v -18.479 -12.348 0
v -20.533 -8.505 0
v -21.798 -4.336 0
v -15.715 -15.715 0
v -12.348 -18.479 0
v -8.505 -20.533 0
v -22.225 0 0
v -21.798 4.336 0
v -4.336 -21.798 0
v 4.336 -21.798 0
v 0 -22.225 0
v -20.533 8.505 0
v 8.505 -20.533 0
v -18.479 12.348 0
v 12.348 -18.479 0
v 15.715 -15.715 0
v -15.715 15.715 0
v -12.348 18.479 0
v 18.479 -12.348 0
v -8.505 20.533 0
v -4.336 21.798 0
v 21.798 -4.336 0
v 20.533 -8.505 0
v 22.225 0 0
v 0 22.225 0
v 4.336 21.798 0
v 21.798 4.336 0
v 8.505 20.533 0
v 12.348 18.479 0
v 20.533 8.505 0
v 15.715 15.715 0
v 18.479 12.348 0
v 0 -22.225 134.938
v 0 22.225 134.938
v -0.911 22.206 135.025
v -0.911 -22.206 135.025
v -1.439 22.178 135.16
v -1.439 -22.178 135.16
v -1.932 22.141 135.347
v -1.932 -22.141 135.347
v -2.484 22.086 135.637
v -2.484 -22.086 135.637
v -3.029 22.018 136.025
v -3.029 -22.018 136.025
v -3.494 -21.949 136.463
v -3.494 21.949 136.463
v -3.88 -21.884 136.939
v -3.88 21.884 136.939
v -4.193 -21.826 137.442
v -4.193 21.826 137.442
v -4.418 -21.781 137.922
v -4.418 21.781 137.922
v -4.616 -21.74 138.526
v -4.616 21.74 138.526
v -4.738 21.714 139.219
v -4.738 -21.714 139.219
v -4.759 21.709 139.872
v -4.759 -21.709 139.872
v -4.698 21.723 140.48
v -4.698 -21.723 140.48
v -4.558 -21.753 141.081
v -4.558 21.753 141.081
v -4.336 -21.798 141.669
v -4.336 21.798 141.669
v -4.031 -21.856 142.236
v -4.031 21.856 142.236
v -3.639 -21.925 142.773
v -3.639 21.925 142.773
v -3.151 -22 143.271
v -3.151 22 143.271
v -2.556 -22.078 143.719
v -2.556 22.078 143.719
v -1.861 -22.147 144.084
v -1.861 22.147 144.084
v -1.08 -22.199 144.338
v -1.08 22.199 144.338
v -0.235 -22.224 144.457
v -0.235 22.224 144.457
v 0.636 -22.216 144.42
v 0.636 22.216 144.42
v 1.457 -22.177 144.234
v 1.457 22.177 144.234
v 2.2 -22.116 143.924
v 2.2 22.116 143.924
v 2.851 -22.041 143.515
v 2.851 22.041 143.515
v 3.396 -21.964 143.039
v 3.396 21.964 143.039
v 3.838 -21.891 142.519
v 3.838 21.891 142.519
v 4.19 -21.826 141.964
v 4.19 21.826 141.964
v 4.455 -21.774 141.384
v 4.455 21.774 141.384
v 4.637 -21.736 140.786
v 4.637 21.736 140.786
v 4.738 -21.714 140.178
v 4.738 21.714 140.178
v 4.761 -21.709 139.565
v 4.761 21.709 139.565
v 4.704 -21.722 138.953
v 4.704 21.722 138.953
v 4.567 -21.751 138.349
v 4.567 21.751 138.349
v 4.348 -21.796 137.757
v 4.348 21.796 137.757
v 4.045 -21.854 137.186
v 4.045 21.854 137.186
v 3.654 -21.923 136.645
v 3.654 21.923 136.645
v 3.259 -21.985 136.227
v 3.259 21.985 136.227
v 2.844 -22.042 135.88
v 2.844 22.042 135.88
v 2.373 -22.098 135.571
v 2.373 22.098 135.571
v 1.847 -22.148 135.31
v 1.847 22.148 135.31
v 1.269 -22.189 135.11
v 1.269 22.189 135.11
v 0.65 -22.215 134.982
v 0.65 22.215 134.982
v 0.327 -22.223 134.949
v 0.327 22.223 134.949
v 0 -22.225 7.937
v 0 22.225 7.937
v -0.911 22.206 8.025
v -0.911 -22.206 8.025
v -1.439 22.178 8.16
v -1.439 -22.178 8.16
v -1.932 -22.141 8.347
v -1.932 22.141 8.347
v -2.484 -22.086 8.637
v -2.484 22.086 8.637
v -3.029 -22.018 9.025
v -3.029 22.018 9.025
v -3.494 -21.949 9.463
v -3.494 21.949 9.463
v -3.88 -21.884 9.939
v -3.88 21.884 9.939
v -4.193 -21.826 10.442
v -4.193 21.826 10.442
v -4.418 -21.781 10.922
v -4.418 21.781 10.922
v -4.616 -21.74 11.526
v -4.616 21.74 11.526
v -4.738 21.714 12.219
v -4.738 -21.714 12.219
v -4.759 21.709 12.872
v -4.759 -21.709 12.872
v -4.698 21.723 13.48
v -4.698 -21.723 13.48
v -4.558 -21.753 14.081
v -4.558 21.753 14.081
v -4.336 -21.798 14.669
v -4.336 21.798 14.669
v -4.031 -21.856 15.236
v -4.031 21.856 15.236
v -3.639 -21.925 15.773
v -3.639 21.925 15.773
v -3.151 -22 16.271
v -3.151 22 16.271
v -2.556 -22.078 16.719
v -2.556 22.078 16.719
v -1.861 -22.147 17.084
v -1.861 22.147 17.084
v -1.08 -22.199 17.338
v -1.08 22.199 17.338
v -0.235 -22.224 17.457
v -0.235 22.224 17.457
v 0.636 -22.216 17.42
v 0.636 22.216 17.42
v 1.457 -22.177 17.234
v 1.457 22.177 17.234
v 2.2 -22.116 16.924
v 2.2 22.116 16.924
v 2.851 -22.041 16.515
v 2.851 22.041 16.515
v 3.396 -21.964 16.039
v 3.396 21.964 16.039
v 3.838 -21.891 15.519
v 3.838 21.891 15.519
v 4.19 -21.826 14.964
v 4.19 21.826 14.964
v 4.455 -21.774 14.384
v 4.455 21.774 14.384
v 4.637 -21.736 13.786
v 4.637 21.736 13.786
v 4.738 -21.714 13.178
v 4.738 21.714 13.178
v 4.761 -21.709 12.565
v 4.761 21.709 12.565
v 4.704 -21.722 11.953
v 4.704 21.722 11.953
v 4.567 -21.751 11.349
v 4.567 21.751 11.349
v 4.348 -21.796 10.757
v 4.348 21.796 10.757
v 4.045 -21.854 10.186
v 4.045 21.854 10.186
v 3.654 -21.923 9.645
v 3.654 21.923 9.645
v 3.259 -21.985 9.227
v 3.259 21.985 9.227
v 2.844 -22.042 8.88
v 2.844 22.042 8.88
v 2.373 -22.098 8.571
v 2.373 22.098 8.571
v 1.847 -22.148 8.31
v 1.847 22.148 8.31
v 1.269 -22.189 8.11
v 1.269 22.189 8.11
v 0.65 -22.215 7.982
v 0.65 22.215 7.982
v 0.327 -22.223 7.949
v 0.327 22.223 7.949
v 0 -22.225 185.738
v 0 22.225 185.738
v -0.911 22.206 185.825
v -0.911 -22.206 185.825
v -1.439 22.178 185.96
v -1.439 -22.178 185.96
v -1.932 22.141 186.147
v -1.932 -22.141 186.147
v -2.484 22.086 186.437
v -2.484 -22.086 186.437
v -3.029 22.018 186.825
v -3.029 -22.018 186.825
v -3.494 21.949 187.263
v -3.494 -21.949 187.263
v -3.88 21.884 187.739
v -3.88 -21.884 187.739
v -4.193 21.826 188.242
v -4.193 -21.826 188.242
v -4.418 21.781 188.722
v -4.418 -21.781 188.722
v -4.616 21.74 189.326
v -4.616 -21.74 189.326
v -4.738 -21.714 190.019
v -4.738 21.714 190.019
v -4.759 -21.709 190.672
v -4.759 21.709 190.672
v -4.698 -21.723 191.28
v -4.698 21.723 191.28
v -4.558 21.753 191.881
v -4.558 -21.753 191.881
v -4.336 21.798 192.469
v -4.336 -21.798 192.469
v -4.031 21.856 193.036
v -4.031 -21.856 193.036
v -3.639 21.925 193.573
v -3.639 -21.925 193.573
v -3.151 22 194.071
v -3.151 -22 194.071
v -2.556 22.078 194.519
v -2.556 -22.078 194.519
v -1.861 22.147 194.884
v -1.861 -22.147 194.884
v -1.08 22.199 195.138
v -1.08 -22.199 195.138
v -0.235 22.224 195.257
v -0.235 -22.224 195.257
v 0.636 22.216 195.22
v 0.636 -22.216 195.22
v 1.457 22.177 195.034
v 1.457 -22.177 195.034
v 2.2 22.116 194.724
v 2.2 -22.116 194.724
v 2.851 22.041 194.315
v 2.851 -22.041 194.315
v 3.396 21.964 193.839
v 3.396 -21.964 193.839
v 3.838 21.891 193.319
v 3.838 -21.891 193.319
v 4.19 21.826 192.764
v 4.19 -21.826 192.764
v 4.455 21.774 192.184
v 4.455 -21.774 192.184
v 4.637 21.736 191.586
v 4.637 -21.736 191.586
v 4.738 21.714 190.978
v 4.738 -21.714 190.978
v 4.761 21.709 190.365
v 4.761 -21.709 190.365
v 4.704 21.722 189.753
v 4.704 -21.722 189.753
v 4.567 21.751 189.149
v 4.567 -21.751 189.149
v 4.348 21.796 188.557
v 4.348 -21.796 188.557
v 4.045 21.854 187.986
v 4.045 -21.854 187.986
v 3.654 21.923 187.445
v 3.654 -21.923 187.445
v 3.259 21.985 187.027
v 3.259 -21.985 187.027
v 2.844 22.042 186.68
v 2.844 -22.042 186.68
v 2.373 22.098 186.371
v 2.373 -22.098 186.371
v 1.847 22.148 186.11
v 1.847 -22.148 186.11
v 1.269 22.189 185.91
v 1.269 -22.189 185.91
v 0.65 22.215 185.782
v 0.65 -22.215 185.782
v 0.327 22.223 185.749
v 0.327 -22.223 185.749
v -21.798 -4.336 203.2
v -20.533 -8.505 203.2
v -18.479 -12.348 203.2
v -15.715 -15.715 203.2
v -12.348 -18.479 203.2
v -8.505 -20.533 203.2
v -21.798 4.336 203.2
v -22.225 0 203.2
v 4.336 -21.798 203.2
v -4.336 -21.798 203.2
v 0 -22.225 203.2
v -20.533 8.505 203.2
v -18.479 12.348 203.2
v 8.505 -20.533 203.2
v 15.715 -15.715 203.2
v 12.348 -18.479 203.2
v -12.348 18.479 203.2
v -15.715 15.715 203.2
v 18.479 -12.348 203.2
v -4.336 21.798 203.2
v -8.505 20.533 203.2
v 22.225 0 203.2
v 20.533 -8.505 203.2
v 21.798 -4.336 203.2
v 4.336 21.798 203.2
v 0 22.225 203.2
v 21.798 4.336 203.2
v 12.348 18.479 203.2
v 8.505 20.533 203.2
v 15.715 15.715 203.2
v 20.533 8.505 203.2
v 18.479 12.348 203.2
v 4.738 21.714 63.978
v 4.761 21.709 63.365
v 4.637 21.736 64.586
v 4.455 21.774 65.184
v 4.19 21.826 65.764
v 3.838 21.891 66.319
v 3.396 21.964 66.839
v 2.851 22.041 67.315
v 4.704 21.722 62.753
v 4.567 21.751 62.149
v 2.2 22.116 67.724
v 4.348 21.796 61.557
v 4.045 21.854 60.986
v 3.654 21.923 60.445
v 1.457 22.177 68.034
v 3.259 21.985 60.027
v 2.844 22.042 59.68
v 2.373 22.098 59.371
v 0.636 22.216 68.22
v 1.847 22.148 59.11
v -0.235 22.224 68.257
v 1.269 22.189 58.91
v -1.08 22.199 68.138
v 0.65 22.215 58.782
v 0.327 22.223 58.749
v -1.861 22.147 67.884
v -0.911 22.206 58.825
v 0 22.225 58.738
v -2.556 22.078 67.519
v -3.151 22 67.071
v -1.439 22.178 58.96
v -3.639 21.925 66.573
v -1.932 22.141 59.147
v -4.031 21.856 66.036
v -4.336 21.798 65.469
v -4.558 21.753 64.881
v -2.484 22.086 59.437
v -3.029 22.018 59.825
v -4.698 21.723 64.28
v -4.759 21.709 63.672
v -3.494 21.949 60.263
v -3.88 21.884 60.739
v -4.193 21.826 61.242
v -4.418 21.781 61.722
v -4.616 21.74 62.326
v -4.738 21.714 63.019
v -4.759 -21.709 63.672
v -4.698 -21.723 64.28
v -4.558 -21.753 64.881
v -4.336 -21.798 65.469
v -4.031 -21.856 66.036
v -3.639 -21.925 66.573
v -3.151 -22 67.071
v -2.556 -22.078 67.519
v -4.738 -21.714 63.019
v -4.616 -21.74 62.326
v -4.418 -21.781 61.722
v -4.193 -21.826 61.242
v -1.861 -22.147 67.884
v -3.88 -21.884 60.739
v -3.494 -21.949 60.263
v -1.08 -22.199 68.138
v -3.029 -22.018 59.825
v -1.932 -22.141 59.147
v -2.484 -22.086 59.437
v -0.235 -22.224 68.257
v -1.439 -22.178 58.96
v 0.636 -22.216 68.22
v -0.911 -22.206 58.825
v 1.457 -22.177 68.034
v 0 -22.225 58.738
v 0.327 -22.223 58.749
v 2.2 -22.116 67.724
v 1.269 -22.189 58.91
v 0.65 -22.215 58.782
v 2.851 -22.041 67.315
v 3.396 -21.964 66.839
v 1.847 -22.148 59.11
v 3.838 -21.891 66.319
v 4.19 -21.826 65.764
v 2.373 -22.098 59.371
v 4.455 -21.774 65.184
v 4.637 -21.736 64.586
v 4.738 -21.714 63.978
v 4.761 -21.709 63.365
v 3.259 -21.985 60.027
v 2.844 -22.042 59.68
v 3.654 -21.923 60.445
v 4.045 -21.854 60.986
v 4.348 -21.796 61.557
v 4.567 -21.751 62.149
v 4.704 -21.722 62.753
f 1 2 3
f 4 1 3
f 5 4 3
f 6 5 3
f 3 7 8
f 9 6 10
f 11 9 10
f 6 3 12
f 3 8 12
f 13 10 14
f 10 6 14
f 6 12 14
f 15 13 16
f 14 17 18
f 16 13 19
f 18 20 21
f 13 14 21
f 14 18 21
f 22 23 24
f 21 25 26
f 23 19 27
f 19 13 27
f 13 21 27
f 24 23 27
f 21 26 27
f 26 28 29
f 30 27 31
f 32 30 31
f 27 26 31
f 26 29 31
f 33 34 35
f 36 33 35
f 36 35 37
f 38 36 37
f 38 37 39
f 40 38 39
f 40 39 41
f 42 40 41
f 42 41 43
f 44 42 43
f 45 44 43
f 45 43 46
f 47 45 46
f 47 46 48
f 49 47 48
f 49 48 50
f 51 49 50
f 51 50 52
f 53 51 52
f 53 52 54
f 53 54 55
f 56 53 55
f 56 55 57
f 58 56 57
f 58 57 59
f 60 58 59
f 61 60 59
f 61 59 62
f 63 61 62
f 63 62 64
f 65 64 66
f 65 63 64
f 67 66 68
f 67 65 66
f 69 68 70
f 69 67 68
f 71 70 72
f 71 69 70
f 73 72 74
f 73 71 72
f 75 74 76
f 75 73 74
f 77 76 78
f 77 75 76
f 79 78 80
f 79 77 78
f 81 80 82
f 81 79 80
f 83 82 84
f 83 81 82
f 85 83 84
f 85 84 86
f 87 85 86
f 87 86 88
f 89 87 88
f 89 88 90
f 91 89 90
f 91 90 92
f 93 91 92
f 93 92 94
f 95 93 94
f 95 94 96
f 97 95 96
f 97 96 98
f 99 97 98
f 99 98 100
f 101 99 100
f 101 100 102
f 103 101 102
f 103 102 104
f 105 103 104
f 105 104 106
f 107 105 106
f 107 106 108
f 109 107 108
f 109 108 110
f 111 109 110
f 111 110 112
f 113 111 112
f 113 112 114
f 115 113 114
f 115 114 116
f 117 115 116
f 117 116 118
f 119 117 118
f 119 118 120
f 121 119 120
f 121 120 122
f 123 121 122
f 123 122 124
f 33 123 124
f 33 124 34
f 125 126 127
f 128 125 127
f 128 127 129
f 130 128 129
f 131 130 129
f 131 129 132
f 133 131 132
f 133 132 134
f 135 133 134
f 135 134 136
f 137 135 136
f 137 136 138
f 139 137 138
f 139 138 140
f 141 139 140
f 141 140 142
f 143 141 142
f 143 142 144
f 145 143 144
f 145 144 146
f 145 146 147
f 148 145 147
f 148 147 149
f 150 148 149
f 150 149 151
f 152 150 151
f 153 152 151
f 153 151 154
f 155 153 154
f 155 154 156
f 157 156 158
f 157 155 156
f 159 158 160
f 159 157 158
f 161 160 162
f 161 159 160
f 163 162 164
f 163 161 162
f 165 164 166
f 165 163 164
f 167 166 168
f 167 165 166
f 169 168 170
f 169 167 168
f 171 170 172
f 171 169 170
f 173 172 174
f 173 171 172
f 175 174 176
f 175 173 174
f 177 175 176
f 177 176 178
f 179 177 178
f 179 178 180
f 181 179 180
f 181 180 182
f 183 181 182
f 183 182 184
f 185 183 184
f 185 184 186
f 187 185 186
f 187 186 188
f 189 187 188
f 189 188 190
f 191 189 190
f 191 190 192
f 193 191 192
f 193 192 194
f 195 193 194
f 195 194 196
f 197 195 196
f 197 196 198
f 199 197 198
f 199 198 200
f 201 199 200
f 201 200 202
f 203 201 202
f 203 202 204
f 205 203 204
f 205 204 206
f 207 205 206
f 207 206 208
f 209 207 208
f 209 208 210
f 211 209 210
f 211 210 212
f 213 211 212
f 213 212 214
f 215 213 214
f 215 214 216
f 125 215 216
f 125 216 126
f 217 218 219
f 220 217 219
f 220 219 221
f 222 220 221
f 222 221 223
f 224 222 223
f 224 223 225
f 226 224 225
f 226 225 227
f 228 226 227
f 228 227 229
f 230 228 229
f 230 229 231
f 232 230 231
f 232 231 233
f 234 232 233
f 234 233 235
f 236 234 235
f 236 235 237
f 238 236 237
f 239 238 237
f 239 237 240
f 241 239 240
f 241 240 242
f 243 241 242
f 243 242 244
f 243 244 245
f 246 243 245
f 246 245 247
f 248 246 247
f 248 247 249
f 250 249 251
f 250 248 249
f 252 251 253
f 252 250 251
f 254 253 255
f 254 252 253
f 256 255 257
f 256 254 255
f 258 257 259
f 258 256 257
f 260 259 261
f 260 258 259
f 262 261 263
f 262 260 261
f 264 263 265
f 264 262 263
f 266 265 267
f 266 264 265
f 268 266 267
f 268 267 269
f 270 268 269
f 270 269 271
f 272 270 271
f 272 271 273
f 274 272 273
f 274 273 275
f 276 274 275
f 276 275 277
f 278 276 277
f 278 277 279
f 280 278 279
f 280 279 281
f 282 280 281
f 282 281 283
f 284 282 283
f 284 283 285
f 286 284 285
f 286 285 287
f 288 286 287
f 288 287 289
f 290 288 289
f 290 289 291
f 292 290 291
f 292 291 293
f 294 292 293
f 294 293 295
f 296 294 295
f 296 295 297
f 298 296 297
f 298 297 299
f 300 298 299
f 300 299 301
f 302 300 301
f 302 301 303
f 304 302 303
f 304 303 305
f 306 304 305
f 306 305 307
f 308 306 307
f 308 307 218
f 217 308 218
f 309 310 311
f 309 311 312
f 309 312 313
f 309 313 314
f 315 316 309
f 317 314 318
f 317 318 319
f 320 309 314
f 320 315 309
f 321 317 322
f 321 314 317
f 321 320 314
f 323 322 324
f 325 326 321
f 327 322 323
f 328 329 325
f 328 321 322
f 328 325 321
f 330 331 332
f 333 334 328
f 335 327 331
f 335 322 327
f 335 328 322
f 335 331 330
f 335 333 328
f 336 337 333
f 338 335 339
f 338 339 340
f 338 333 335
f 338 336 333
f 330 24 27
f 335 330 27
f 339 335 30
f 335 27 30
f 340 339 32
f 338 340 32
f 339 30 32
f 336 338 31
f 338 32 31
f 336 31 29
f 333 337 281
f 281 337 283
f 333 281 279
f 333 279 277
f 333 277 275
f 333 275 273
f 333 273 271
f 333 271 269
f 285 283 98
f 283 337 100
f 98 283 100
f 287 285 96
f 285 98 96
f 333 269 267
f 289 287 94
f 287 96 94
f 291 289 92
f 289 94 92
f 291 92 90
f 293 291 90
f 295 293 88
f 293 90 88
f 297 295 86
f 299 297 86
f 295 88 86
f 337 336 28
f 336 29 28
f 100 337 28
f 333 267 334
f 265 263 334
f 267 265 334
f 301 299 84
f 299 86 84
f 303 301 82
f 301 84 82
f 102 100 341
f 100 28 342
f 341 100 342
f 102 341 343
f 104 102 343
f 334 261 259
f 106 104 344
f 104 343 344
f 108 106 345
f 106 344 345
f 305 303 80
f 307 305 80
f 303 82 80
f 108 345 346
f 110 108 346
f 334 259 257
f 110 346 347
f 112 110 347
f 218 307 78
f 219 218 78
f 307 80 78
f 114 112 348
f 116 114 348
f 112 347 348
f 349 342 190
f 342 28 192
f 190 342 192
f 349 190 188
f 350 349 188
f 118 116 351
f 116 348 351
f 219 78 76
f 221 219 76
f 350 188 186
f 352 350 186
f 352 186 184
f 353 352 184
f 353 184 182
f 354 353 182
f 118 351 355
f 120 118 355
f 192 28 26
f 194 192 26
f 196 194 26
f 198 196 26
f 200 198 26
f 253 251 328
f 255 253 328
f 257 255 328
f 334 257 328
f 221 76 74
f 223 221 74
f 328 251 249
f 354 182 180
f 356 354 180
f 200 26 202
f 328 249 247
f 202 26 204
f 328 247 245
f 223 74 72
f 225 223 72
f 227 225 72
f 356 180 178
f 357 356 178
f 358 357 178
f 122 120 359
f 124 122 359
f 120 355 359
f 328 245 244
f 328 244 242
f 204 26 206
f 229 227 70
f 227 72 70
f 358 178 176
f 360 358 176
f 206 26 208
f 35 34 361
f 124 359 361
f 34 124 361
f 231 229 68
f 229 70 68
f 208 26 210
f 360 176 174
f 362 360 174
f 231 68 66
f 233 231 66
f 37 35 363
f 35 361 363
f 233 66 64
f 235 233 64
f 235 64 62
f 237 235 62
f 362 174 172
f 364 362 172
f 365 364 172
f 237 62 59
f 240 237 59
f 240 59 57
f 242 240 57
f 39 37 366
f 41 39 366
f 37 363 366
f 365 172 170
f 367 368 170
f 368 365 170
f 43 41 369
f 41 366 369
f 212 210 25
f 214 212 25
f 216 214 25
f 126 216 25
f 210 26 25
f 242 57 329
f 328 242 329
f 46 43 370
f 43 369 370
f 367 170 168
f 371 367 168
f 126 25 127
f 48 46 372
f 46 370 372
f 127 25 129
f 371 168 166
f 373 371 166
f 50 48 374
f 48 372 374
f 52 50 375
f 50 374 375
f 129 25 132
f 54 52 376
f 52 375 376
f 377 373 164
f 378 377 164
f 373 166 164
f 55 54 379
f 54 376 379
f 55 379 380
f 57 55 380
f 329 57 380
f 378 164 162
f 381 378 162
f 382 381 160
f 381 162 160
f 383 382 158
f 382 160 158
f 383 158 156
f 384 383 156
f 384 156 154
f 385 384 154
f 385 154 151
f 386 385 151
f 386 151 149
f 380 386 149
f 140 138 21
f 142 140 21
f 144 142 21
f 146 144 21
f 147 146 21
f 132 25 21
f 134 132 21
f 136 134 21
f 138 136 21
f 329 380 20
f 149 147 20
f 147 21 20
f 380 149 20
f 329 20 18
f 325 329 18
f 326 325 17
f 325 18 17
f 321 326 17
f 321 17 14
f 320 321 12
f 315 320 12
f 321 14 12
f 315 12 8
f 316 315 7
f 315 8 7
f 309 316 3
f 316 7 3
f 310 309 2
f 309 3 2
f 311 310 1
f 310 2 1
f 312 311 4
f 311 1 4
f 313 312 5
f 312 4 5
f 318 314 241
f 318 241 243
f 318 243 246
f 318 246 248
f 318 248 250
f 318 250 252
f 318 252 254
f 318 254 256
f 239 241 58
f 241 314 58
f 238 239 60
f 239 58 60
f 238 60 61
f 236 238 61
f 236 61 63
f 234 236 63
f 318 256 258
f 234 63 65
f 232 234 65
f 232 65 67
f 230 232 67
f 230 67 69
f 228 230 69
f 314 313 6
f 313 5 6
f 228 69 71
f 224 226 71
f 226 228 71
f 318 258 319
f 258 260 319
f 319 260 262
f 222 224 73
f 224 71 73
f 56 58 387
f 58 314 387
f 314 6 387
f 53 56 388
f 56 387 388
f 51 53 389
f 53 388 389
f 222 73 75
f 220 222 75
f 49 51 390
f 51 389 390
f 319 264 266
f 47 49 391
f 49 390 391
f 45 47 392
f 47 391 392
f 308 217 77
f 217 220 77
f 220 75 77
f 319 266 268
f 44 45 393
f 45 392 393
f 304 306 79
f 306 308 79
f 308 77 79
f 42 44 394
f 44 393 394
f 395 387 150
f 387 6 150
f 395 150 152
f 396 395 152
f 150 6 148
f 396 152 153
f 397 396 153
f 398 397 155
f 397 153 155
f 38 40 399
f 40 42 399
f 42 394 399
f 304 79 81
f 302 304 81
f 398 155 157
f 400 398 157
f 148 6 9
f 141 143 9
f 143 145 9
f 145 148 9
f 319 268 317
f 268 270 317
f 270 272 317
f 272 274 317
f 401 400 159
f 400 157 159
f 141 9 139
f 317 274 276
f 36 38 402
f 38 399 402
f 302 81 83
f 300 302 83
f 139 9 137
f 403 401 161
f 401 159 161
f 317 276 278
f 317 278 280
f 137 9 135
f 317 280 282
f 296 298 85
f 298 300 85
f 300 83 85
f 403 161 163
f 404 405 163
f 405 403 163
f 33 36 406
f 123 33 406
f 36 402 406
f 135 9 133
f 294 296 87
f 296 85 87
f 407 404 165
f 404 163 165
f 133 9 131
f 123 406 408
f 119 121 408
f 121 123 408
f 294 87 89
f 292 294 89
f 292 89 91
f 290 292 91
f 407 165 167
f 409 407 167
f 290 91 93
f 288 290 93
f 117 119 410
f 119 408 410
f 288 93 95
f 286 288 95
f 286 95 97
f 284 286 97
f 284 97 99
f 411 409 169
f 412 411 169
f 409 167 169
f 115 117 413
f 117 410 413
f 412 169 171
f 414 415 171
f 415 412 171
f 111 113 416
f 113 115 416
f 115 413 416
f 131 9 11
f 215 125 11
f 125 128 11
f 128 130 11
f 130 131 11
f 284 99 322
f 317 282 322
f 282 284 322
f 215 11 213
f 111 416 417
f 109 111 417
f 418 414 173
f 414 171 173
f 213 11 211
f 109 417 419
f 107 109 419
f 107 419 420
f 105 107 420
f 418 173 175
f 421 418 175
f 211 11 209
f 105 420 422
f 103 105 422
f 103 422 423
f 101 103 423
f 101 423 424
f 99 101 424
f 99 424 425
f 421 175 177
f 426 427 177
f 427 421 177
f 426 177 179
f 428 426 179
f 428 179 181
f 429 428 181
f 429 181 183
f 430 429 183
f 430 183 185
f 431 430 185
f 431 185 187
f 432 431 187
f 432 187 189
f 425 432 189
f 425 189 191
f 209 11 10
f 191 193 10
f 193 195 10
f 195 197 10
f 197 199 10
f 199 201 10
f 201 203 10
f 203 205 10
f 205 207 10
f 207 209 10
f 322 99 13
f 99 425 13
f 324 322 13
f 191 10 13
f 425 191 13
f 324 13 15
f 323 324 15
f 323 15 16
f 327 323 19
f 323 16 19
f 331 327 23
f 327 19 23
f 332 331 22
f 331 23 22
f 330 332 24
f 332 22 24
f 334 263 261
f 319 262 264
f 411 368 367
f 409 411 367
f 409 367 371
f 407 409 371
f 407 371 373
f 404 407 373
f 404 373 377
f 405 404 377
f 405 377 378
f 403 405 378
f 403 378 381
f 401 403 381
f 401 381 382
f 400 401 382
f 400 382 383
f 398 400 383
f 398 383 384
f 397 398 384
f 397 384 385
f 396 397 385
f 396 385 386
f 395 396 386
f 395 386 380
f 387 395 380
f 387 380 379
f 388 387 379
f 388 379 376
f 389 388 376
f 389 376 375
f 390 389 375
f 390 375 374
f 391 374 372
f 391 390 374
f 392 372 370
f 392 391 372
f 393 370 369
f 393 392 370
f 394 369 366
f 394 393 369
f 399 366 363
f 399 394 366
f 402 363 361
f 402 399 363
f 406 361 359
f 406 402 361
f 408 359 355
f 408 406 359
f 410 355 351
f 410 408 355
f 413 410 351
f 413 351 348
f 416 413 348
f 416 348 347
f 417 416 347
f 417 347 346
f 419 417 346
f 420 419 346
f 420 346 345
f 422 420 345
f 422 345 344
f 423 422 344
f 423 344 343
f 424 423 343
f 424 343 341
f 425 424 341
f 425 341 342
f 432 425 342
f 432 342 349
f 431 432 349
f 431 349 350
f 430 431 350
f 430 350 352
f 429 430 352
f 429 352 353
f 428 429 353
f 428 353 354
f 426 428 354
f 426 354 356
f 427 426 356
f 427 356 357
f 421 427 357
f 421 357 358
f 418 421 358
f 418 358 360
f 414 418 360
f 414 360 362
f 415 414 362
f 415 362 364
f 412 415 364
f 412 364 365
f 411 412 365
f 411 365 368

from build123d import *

# Parameters (mm, degrees)
SKETCH1_R               = 22.225
BOSS_EXTRUDE1_DEPTH     = 203.2
CUT_EXTRUDE1_DEPTH      = 203.2
CUT_EXTRUDE1_DEPTH_BACK = 203.2
SKETCH2_R               = 4.7625


with BuildPart() as part:
    # Sketch1 → Boss-Extrude1 (new body)
    with BuildSketch(Plane.XY):
        Circle(SKETCH1_R)
    extrude(amount=BOSS_EXTRUDE1_DEPTH)

    # Sketch2 → Cut-Extrude1 (cut, two sides: drawn at the far end of the back side and taken through both)
    with BuildSketch(Plane(origin=(0, 0, 0), x_dir=(1, 0, 0), z_dir=(0, 1, 0)).offset(-CUT_EXTRUDE1_DEPTH_BACK)):
        with Locations((0, -190.5)):
            Circle(SKETCH2_R)
        with Locations((0, -139.7)):
            Circle(SKETCH2_R)
        with Locations((0, -12.7)):
            Circle(SKETCH2_R)
        with Locations((0, -63.5)):
            Circle(SKETCH2_R)
    extrude(amount=CUT_EXTRUDE1_DEPTH + CUT_EXTRUDE1_DEPTH_BACK, mode=Mode.SUBTRACT)


solid = part.part
